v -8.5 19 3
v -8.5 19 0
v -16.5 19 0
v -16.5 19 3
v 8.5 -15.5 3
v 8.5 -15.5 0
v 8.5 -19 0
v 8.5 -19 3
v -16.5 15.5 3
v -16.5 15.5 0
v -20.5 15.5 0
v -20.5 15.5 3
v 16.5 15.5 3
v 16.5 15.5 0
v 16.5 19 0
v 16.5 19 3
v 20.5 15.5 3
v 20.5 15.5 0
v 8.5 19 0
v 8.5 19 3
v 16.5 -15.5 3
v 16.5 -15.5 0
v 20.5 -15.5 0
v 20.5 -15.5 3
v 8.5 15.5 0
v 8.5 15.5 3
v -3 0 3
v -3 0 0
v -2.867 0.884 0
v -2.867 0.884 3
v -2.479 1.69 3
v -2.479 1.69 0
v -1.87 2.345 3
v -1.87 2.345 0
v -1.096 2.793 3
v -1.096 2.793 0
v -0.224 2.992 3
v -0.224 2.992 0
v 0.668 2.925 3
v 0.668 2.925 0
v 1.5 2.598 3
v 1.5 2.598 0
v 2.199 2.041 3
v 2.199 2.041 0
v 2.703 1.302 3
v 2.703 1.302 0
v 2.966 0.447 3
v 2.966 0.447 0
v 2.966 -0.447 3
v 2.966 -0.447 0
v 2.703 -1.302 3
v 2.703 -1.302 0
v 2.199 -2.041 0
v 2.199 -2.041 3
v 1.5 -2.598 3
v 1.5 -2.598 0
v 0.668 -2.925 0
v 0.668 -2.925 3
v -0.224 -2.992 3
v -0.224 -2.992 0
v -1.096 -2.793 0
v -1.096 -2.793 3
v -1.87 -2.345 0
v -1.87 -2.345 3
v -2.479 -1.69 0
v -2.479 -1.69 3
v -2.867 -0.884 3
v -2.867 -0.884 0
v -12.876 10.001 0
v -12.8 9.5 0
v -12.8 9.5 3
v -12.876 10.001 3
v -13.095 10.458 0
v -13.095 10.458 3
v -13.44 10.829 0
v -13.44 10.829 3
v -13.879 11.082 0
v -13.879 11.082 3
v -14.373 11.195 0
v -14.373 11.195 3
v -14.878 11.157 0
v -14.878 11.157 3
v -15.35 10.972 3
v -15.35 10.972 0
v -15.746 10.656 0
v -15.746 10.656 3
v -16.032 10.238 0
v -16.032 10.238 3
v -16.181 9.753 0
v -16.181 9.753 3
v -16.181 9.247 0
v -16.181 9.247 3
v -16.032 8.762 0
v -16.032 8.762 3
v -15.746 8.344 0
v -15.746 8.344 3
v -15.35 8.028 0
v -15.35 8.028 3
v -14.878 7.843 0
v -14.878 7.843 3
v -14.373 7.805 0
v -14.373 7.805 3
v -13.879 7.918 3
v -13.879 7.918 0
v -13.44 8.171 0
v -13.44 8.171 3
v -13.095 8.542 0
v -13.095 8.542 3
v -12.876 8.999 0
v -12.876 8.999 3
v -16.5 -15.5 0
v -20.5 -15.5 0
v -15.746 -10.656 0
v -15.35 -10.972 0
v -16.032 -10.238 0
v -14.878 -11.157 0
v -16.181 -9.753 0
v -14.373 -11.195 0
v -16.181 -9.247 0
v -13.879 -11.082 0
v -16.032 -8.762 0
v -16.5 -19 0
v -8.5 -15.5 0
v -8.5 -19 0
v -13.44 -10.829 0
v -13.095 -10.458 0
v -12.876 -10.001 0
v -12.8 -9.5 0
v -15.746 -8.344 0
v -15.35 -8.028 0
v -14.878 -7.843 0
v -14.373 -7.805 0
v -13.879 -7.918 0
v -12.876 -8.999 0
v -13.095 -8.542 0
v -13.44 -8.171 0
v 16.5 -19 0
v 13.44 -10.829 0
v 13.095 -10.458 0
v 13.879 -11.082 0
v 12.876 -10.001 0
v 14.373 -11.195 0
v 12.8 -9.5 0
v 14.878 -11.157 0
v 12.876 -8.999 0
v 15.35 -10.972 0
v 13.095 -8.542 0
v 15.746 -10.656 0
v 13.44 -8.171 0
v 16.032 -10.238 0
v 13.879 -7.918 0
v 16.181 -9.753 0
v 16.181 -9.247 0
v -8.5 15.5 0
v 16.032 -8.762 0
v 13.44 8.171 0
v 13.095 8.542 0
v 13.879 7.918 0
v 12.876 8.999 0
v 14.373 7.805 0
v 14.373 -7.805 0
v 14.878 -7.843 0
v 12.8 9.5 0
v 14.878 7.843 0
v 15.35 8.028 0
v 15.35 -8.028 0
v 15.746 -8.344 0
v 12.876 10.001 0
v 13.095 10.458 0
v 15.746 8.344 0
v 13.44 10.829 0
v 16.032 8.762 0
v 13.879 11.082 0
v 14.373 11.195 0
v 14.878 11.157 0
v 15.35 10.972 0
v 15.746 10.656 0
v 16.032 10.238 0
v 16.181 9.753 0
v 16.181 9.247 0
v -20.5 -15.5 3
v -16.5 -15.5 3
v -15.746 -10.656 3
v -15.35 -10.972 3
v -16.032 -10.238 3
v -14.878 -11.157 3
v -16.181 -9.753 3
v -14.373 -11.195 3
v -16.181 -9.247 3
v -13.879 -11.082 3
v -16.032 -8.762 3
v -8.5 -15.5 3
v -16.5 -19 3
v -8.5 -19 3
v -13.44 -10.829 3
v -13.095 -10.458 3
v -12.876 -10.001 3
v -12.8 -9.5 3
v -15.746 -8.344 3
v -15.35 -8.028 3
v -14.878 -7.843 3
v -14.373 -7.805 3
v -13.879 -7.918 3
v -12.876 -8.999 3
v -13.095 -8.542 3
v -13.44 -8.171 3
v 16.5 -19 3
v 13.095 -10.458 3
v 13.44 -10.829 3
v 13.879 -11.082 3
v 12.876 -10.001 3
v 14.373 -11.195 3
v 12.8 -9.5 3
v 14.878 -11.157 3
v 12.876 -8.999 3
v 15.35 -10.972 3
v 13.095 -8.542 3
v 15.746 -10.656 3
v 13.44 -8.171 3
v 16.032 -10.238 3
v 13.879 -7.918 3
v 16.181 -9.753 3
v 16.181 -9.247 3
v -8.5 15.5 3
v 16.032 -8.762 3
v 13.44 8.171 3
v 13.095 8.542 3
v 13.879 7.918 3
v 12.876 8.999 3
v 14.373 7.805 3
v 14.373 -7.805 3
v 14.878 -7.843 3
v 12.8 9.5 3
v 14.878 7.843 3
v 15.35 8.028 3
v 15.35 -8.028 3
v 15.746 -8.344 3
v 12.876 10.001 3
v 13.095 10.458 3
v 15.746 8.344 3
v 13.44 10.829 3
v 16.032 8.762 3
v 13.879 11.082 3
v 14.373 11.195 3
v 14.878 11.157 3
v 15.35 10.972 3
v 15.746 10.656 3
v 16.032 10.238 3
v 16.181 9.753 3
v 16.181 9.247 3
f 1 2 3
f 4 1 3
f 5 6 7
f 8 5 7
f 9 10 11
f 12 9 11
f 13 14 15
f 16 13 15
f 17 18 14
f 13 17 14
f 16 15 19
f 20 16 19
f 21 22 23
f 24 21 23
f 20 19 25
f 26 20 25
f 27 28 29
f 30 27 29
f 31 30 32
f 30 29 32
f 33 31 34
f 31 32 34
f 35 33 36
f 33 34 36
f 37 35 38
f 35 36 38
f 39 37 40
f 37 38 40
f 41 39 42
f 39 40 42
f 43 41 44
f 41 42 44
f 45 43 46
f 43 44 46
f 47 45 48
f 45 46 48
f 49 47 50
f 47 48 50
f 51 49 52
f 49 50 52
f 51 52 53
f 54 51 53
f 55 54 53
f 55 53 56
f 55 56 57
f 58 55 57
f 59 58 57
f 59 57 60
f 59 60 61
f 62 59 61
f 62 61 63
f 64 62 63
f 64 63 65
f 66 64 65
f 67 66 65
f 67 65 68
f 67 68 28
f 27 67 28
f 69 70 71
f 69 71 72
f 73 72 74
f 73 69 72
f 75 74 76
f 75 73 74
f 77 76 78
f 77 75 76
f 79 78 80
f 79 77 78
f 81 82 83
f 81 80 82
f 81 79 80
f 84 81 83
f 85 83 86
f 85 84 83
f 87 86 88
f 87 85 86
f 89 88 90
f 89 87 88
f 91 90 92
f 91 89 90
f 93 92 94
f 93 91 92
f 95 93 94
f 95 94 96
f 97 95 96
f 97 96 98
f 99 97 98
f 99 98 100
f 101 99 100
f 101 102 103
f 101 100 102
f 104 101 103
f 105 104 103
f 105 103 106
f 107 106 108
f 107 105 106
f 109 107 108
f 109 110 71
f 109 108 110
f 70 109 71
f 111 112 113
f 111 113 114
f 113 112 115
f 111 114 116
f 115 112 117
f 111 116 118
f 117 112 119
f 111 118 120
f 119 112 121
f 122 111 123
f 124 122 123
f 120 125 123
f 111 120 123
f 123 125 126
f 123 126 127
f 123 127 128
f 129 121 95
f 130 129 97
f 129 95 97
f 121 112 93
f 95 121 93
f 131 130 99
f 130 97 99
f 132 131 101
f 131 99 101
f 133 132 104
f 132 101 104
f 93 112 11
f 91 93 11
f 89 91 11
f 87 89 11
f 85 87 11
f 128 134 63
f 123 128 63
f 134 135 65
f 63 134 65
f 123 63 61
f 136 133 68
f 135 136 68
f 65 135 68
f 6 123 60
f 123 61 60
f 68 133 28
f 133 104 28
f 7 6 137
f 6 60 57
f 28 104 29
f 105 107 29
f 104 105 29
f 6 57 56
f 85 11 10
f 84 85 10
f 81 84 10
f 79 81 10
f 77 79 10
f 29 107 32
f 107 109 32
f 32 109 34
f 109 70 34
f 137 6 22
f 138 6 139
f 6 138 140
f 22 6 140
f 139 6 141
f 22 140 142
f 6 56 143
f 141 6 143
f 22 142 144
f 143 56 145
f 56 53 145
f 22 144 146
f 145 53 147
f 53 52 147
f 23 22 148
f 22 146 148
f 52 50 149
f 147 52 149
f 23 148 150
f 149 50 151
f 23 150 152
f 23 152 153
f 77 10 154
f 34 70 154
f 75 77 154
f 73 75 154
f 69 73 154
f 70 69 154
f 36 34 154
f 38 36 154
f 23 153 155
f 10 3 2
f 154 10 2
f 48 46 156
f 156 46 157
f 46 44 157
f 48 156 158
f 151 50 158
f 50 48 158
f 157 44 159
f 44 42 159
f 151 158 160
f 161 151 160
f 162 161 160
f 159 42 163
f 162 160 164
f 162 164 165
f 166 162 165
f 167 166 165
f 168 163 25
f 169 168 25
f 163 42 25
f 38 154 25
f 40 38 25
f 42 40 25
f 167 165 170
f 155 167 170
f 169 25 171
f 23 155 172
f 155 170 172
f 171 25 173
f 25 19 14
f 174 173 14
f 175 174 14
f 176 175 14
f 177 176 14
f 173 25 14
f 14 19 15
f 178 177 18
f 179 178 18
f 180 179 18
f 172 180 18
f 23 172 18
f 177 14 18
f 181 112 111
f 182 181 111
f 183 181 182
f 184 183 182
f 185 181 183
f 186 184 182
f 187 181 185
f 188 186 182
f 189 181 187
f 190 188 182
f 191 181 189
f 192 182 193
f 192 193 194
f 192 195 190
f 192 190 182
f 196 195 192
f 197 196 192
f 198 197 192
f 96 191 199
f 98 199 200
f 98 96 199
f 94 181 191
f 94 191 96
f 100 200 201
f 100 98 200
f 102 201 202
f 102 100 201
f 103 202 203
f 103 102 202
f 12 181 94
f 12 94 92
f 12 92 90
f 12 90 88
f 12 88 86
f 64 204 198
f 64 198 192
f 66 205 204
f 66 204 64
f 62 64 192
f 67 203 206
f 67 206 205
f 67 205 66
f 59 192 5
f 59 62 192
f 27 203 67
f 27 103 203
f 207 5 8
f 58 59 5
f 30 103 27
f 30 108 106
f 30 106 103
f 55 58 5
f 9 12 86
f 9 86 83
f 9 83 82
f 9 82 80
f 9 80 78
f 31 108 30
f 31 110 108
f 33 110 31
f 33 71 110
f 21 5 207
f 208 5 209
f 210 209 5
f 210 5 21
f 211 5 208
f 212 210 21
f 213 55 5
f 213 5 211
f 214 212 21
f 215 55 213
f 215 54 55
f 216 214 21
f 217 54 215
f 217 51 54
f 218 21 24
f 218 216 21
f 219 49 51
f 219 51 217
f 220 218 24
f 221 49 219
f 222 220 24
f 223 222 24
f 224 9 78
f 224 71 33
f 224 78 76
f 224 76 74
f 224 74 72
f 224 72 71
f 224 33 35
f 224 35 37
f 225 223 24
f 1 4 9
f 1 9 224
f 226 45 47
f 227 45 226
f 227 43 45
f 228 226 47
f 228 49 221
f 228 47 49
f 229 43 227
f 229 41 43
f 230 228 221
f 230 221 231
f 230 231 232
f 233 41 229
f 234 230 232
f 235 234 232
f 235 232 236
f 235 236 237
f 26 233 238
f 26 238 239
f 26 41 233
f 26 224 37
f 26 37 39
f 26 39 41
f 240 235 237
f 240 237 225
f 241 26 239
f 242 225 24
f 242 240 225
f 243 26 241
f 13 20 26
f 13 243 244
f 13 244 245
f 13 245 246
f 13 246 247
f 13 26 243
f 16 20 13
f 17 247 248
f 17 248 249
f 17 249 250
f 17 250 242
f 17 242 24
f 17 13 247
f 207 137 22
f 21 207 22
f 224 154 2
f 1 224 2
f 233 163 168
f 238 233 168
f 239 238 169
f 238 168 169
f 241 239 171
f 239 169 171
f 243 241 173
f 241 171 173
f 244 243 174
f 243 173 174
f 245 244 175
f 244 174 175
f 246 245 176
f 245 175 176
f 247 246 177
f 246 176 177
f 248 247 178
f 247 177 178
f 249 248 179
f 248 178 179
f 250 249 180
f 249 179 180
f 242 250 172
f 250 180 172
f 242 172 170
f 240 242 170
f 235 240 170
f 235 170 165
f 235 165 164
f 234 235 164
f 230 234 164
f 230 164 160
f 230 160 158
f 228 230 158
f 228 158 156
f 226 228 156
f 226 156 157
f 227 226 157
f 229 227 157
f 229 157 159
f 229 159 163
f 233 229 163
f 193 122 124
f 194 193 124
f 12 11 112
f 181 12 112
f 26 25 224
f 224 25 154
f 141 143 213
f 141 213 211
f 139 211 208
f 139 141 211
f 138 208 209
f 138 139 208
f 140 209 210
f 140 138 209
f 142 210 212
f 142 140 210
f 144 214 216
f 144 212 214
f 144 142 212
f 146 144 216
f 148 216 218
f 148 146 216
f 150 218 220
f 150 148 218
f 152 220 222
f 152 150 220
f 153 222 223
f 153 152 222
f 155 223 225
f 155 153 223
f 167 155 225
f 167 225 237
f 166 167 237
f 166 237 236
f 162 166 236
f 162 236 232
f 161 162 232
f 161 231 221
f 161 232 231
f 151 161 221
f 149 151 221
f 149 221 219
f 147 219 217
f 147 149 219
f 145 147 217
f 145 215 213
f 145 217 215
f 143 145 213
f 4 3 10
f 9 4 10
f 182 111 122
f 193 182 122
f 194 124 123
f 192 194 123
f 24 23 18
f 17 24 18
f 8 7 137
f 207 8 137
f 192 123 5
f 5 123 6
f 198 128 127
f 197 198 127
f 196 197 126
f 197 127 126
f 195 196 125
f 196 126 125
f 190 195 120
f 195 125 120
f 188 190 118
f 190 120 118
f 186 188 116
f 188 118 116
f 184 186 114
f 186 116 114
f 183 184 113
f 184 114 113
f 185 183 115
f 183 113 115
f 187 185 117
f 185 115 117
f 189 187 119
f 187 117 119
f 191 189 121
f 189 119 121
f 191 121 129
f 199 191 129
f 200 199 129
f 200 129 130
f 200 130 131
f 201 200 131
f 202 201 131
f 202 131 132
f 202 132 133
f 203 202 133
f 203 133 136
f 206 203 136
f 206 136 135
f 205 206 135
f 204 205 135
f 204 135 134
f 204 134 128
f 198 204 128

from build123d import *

# Parameters (mm, degrees)
BOSS_EXTRUDE1_DEPTH          = 3
F_6_0_6_DIAMETER_HOLE1_D     = 6
F_6_0_6_DIAMETER_HOLE1_DEPTH = 3
M3_CLEARANCE_HOLE1_D         = 3.4
M3_CLEARANCE_HOLE1_DEPTH     = 3.001
MIRROR2_COPY_1_D             = 3.4
MIRROR2_COPY_1_DEPTH         = 3.001


with BuildPart() as part:
    # Sketch1 → Boss-Extrude1 (new body)
    with BuildSketch(Plane.XY):
        Polygon((20.5, -15.5), (20.5, 15.5), (16.5, 15.5), (16.5, 19), (8.5, 19), (8.5, 15.5), (-8.5, 15.5), (-8.5, 19), (-16.5, 19), (-16.5, 15.5), (-20.5, 15.5), (-20.5, -15.5), (-16.5, -15.5), (-16.5, -19), (-8.5, -19), (-8.5, -15.5), (8.5, -15.5), (8.5, -19), (16.5, -19), (16.5, -15.5), align=None)
    extrude(amount=BOSS_EXTRUDE1_DEPTH)

    # Ø6.0 (6) Diameter Hole1
    with Locations(Plane.XY.offset(3)):
        with Locations((0, 0)):
            Hole(F_6_0_6_DIAMETER_HOLE1_D / 2, depth=F_6_0_6_DIAMETER_HOLE1_DEPTH)

    # M3 Clearance Hole1
    with Locations(Plane.XY.offset(3)):
        with Locations((14.5, 9.5)):
            m3_clearance_hole1 = Hole(M3_CLEARANCE_HOLE1_D / 2, depth=M3_CLEARANCE_HOLE1_DEPTH)

    # Mirror1: M3 Clearance Hole1 across plane
    add(m3_clearance_hole1.mirror(Plane(origin=(0, 0, 0), x_dir=(0, 0, 1), z_dir=(1, 0, 0))), mode=Mode.SUBTRACT)

    # Mirror2: M3 Clearance Hole1 across plane
    add(m3_clearance_hole1.mirror(Plane.ZX), mode=Mode.SUBTRACT)

    # Mirror2 copy 1
    with Locations(Plane(origin=(0, 0, 3), x_dir=(-1, 0, 0), z_dir=(0, 0, 1))):
        with Locations((14.5, 9.5)):
            Hole(MIRROR2_COPY_1_D / 2, depth=MIRROR2_COPY_1_DEPTH)


solid = part.part
